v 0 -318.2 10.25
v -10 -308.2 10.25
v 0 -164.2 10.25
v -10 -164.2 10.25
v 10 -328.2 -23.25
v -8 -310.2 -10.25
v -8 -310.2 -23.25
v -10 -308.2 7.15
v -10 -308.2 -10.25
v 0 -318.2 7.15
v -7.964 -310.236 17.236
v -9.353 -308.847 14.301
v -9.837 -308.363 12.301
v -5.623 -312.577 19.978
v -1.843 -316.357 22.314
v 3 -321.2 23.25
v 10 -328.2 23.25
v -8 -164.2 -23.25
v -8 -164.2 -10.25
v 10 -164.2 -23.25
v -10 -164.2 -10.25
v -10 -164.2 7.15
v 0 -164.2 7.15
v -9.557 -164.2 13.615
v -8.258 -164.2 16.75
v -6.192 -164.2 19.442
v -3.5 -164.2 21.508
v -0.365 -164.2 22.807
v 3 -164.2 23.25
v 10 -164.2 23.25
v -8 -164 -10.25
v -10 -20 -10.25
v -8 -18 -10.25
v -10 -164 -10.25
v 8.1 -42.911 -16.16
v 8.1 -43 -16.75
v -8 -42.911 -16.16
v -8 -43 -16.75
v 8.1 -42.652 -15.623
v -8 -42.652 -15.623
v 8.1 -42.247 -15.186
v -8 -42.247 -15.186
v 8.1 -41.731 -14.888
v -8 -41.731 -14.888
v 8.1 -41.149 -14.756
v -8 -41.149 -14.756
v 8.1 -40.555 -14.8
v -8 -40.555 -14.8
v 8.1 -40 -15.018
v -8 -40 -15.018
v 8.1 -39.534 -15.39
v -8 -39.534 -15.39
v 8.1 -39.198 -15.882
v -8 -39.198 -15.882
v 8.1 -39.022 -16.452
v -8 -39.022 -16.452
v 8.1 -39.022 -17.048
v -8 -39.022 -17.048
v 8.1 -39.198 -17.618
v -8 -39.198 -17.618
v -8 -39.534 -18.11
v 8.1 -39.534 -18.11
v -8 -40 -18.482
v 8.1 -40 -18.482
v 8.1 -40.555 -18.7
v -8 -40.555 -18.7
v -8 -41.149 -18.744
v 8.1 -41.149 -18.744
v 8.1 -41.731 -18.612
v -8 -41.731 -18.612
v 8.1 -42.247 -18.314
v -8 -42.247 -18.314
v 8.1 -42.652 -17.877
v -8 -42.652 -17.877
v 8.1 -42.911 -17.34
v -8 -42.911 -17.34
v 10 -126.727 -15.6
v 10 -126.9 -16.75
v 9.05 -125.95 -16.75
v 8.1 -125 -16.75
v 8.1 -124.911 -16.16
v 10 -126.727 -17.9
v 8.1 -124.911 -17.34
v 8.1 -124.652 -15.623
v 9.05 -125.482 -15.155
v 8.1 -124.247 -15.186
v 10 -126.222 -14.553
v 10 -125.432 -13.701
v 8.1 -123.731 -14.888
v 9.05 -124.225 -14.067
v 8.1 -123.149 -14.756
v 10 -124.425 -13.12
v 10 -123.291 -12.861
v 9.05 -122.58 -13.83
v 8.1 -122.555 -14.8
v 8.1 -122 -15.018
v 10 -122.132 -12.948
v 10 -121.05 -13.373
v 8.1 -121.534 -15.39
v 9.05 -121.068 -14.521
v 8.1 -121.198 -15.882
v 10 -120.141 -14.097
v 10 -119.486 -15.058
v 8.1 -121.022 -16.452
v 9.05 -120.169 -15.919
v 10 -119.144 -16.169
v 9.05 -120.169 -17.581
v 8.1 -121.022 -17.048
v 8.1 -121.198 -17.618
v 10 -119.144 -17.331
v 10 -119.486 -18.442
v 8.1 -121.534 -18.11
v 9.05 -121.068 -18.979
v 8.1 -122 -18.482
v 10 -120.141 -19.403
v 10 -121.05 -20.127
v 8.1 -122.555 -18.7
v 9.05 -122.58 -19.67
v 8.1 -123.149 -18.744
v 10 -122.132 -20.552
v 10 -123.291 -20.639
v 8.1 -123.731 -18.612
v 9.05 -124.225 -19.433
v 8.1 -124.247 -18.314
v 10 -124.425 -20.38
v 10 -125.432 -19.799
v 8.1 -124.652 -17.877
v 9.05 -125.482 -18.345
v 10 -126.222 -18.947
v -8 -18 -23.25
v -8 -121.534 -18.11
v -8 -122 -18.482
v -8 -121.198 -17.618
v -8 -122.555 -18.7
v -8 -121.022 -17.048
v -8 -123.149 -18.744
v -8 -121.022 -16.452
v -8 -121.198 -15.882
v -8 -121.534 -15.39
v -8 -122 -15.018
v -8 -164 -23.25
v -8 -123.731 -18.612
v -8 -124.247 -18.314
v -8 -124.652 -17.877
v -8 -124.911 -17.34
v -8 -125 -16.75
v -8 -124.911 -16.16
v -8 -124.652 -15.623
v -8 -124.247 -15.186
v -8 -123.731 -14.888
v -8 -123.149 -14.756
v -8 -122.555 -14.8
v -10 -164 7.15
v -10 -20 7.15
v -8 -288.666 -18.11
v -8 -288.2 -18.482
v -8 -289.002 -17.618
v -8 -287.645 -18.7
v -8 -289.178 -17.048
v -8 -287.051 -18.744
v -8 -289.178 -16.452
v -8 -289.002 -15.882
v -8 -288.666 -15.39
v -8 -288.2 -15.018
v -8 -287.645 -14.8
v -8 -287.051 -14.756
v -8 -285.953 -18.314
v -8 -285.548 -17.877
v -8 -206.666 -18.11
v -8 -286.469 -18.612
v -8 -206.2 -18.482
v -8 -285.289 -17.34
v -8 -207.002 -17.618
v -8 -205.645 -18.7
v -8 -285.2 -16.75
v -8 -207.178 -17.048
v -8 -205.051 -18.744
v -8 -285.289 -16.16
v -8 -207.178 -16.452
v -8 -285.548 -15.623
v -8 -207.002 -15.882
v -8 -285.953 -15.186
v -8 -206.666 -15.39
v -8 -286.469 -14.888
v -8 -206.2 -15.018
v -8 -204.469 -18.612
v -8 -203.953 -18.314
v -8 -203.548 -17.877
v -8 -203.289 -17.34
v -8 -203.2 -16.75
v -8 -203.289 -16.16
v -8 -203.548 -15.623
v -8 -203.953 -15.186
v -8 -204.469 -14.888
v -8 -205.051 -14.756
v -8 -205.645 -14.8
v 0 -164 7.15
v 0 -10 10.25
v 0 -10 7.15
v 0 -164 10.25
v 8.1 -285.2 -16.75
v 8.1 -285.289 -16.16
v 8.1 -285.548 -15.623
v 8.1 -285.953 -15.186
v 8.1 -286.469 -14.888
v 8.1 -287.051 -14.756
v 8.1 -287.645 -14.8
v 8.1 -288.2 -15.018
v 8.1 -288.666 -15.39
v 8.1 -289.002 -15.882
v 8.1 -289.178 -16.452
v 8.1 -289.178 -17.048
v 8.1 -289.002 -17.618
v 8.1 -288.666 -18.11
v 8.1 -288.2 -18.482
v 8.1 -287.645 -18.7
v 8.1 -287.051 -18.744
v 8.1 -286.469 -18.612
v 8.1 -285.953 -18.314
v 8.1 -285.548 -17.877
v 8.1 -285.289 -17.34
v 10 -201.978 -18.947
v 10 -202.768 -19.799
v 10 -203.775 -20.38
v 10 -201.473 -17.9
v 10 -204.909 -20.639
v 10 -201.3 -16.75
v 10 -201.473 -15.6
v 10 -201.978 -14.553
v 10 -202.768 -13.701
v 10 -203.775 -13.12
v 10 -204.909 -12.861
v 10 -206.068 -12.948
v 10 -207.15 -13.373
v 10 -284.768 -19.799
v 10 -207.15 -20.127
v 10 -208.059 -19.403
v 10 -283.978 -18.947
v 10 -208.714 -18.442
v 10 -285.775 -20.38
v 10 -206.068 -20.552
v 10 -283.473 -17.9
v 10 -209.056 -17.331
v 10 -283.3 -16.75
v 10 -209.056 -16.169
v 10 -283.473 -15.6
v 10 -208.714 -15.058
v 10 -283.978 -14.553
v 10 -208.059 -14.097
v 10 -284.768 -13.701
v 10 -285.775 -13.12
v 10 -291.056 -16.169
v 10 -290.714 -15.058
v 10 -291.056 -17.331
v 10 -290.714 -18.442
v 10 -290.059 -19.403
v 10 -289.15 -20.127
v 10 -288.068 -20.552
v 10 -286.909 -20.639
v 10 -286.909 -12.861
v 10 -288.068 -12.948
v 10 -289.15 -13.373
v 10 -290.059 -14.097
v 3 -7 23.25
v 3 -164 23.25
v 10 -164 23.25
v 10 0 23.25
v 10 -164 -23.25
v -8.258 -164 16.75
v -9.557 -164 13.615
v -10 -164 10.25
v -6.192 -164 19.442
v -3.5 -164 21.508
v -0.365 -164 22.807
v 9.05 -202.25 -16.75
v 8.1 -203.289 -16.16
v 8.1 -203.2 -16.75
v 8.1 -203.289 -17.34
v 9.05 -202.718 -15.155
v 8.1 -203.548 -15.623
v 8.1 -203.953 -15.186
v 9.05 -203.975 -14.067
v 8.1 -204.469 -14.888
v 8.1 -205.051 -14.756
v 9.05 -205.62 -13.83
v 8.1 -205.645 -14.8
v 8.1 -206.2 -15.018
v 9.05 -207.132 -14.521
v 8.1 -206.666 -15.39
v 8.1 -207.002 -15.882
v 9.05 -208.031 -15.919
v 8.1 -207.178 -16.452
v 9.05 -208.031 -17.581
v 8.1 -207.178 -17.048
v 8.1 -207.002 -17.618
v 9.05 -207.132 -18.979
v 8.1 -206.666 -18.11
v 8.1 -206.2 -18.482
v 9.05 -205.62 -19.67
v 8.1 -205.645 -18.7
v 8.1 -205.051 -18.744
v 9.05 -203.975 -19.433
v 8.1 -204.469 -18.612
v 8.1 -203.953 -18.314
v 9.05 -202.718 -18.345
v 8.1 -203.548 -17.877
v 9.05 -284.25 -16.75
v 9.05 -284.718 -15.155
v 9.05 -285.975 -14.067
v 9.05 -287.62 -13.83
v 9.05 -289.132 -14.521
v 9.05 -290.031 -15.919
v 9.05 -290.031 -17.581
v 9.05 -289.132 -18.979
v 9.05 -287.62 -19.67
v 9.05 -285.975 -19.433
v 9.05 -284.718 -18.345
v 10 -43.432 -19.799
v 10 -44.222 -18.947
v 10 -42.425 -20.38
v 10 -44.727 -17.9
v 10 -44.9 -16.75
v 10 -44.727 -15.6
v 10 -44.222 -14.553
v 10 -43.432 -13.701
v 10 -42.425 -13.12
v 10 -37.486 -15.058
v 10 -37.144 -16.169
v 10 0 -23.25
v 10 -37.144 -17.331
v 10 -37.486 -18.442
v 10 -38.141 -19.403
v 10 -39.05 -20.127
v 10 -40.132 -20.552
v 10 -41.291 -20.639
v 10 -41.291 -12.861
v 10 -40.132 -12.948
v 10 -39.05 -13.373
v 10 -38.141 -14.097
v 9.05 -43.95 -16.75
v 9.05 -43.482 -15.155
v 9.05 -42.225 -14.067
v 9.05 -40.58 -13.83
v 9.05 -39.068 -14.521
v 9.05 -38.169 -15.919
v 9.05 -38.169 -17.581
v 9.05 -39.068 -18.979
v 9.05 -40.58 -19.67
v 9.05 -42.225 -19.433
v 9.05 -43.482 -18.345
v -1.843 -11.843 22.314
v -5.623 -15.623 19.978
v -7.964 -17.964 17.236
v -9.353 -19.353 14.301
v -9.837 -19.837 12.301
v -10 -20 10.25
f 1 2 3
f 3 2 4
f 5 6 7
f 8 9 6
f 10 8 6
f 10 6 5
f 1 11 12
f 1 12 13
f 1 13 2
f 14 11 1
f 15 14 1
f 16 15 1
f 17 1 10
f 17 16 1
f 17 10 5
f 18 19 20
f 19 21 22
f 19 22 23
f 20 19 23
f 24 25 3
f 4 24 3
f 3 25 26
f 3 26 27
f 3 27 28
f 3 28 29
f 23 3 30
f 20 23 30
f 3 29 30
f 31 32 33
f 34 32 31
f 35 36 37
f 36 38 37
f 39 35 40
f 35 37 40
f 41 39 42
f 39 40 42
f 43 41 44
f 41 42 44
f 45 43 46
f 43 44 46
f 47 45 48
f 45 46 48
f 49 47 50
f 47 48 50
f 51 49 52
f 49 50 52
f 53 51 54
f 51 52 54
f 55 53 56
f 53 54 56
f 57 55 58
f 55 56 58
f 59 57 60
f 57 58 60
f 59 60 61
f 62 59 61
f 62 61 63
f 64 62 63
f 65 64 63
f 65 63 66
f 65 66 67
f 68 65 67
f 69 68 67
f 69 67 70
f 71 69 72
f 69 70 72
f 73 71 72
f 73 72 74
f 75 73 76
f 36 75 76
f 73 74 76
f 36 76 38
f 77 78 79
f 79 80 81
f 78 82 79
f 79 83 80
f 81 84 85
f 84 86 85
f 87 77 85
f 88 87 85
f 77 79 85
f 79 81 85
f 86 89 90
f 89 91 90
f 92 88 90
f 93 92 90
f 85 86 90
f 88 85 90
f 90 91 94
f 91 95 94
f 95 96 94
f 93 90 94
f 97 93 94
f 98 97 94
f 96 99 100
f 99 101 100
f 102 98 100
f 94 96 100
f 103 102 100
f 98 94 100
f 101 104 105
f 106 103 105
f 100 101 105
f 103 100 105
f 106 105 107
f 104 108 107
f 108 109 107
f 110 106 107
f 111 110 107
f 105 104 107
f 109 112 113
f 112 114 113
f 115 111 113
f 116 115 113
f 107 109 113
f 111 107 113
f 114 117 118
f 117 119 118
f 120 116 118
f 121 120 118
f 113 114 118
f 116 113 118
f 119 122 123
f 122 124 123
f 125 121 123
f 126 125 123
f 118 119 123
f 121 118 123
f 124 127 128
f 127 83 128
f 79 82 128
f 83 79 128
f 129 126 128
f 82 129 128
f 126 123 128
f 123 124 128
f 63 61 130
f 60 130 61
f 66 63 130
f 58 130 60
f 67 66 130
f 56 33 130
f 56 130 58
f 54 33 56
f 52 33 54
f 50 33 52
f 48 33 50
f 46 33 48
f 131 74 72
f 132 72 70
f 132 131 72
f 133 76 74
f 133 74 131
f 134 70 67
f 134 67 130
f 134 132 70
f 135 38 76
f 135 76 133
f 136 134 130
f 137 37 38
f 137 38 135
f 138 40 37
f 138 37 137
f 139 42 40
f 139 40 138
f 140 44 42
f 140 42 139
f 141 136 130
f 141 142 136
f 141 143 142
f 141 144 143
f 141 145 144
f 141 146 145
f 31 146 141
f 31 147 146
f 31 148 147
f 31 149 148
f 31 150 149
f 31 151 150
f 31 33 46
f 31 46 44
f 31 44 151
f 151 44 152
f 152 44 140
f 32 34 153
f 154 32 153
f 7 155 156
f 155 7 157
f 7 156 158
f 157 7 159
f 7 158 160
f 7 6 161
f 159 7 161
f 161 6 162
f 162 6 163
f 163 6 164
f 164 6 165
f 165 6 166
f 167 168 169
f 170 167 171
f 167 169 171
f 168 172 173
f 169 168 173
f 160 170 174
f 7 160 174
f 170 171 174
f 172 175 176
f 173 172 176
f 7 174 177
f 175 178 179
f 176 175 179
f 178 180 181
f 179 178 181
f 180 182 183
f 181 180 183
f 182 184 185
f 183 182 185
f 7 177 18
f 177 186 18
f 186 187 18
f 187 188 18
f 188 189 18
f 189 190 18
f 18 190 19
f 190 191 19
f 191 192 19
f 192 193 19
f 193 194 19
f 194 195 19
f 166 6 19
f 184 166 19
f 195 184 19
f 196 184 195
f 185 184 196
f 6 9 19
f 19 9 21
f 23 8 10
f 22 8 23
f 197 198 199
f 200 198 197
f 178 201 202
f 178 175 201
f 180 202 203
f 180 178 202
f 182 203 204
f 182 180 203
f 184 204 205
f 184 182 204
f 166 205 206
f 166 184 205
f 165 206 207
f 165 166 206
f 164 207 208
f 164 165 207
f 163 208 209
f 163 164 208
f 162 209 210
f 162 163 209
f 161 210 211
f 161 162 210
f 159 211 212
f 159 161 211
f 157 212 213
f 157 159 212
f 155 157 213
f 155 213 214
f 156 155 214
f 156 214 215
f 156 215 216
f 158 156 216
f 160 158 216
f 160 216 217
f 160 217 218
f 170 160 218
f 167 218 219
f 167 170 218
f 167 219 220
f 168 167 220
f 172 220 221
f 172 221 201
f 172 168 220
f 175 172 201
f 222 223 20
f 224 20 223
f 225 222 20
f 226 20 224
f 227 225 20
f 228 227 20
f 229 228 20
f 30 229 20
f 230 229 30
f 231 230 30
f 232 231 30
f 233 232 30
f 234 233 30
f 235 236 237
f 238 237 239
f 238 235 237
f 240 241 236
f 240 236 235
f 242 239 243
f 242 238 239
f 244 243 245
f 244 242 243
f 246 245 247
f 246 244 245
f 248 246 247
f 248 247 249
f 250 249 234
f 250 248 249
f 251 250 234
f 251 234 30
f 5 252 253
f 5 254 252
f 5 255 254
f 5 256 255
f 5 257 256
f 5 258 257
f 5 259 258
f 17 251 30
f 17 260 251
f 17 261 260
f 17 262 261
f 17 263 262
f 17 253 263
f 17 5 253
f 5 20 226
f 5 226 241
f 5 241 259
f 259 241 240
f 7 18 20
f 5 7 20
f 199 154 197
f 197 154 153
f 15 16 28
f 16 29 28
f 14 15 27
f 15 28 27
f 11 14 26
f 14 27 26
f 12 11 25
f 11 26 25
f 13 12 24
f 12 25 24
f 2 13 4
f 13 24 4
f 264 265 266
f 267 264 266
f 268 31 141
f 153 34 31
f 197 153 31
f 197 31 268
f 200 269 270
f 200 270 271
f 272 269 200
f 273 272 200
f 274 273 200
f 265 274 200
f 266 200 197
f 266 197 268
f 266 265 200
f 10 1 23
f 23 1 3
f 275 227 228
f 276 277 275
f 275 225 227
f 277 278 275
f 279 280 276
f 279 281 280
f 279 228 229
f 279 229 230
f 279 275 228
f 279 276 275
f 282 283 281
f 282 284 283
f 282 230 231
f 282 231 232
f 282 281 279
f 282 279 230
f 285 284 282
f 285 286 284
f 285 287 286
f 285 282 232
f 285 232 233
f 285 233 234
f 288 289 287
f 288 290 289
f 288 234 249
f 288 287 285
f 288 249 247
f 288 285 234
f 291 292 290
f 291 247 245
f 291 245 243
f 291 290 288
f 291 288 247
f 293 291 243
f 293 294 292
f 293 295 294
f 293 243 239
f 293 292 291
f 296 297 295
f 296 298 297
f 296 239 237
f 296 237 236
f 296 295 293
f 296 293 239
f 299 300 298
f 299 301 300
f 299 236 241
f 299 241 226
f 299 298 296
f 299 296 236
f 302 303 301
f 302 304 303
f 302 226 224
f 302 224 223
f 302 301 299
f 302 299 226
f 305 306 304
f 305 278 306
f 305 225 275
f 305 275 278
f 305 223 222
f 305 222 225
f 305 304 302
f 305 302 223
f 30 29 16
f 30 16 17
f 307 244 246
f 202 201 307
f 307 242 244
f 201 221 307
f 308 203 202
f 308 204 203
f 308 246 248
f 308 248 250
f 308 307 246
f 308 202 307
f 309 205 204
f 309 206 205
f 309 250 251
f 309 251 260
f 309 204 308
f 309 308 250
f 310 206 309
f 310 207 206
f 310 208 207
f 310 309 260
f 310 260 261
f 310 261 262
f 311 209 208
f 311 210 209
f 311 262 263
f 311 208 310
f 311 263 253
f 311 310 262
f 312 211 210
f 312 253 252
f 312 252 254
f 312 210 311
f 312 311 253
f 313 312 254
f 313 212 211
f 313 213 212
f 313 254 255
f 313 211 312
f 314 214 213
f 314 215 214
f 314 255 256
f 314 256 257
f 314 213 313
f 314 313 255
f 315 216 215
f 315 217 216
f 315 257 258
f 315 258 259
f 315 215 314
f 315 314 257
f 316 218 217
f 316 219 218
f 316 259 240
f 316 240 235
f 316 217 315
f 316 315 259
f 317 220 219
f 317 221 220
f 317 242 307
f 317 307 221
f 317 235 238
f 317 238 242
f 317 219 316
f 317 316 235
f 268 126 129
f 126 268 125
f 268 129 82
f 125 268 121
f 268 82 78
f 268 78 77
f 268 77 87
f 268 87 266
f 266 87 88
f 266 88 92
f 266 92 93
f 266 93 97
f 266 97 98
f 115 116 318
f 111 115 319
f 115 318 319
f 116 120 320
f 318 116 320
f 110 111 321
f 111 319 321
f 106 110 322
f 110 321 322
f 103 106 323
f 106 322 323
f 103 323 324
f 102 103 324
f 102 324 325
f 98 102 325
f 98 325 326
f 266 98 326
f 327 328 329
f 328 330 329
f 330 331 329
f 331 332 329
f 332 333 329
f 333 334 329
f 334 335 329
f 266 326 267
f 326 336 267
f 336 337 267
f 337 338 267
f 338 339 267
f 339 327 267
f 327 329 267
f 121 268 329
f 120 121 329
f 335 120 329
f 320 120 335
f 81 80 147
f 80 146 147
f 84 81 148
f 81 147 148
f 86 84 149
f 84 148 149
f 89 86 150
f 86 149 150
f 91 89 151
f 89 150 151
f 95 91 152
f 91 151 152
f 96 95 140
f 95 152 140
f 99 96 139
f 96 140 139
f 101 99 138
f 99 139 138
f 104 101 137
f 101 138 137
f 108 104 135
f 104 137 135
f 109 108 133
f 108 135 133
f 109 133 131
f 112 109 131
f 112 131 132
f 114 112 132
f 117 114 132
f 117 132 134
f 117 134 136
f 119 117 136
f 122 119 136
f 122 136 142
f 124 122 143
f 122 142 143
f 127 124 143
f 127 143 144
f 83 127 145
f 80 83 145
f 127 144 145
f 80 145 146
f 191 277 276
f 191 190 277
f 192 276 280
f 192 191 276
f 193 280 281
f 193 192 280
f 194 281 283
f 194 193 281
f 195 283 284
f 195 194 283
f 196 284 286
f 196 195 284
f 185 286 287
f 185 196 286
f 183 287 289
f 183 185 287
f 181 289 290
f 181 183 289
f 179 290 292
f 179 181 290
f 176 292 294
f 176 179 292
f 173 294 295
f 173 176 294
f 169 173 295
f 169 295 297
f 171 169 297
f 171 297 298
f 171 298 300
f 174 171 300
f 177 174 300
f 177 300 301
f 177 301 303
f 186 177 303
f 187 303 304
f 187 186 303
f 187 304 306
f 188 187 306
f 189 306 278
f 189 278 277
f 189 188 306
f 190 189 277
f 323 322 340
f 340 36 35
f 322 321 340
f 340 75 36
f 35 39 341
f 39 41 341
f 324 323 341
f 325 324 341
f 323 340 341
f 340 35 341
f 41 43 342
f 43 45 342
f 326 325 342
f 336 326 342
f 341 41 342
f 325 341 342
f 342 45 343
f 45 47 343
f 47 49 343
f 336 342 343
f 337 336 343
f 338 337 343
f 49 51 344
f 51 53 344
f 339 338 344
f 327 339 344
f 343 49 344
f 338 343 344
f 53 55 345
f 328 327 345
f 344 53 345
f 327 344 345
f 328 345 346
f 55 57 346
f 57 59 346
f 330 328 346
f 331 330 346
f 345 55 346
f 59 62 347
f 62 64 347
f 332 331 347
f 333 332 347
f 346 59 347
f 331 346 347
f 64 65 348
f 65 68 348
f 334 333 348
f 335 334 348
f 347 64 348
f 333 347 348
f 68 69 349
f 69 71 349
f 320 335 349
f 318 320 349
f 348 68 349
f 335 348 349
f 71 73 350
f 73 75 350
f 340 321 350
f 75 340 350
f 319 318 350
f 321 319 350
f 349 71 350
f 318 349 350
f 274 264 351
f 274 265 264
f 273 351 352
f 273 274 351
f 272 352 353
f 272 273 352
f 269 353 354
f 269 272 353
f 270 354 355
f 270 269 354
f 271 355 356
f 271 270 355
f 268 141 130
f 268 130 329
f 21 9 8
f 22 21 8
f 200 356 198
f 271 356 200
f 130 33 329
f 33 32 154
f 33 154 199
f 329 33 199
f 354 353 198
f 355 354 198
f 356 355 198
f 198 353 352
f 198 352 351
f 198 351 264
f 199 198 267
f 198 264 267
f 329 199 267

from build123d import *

# Parameters (mm, degrees)
F0_W            = 20
F0_H            = 46.5
F1_DEPTH        = 164
F2_W            = 164
F2_H            = 3.1
F3_DEPTH        = 10
F4_W            = 164
F4_H            = 13
F5_DEPTH        = 2
F7_DEPTH        = 46.5
F8_R            = 12.99999
F10_D           = 4
F10_DEPTH       = 20
F10_CSINK_D     = 7.8
F10_CSINK_ANGLE = 90
F10_TIP         = 1.2017212381


# Not quite as in the source:
# - a fillet or chamfer is up to 0.001 mm smaller than in the source, because OpenCascade refuses the exact size


with BuildPart() as f1:
    # F0 (on Front) → F1 (new body)
    with BuildSketch(Plane.XZ):
        Rectangle(F0_W, F0_H)
    extrude(amount=F1_DEPTH)

    # F2 (on face) → F3 (cut)
    with BuildSketch(Plane(origin=(-10, 0, 0), x_dir=(0, -1, 0), z_dir=(-1, 0, 0))):
        with Locations((82, 8.7)):
            Rectangle(F2_W, F2_H)
    extrude(amount=-F3_DEPTH, mode=Mode.SUBTRACT)

    # F4 (on face) → F5 (cut)
    with BuildSketch(Plane(origin=(-10, 0, 0), x_dir=(0, -1, 0), z_dir=(-1, 0, 0))):
        with Locations((82, -16.75)):
            Rectangle(F4_W, F4_H)
    extrude(amount=-F5_DEPTH, mode=Mode.SUBTRACT)

    # F6 (on face) → F7 (cut, through all)
    with BuildSketch(Plane.XY.offset(23.25)):
        Polygon((-10, 0), (-10, -20), (10, 0), align=None)
    extrude(amount=-F7_DEPTH, mode=Mode.SUBTRACT)

    # F8 (radius 13 in the source; OpenCascade refuses exactly that, so slightly less here)
    f8_edges = [f1.edges().sort_by_distance(p)[0] for p in [
        (-10, -92, 23.25),
    ]]
    fillet(f8_edges, radius=F8_R)

    # F10
    with Locations(Plane.YZ.offset(10)):
        with Locations((-123, -16.75), (-41, -16.75)):
            CounterSinkHole(F10_D / 2, F10_CSINK_D / 2, depth=F10_DEPTH, counter_sink_angle=F10_CSINK_ANGLE)
            with Locations((0, 0, -(F10_DEPTH + F10_TIP / 2))):  # 118° drill point
                Cone(0, F10_D / 2, F10_TIP, mode=Mode.SUBTRACT)


with BuildPart() as f12_1:
    # F12: instance of F1
    add(f1.part.mirror(Plane(origin=(0.7724850415, -164.1, -0.683742713), x_dir=(1, 0, 0), z_dir=(0, -1, 0))))


solid = Compound([f1.part, f12_1.part])
